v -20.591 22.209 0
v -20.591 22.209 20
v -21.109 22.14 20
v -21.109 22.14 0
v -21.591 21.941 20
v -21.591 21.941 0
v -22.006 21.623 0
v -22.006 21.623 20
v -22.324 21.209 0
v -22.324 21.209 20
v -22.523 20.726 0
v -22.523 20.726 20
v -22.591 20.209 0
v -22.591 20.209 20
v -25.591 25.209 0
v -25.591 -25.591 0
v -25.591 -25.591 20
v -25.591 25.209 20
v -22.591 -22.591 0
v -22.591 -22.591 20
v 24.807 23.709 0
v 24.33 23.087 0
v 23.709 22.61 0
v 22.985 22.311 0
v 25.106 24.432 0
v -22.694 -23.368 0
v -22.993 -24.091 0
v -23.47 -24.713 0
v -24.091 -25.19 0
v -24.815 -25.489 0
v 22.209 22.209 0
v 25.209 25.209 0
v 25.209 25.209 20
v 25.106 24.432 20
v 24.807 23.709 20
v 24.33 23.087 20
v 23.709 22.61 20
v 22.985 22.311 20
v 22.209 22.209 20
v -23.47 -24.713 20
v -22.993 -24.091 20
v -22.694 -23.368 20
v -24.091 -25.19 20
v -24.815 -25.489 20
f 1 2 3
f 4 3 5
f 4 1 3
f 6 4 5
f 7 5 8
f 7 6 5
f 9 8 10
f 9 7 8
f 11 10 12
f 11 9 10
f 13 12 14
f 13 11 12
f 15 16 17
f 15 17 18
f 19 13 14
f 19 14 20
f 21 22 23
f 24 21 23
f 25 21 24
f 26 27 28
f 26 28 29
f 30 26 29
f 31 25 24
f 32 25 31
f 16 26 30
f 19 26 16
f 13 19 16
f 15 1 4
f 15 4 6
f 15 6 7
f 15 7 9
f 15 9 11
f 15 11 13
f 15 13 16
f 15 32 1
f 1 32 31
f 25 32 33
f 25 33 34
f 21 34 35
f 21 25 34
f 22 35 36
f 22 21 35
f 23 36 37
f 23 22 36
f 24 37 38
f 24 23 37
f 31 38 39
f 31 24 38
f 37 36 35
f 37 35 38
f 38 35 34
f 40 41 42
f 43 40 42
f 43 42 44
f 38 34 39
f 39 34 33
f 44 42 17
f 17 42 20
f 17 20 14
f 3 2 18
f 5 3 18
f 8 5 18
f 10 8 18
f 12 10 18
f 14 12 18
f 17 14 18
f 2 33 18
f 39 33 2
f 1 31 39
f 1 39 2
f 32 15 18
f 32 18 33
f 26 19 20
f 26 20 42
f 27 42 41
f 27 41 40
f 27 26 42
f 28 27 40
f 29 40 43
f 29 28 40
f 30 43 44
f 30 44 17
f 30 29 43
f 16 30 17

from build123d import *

# Parameters (mm, degrees)
SALIENTE_EXTRUIR1_DEPTH = 20


with BuildPart() as part:
    # Croquis1 → Saliente-Extruir1 (new body)
    with BuildSketch(Plane.XY):
        with BuildLine():
            Line((22.208537854, 22.208537854), (-20.591462146, 22.208537854))
            ThreePointArc((-20.591462146, 22.208537854), (-22.005675708, 21.622751417), (-22.591462146, 20.208537854))
            Line((-22.591462146, 20.208537854), (-22.591462146, -22.591462146))
            ThreePointArc((-22.591462146, -22.591462146), (-23.470141802, -24.712782489), (-25.591462146, -25.591462146))
            Line((-25.591462146, -25.591462146), (-25.591462146, 25.208537854))
            Line((-25.591462146, 25.208537854), (25.208537854, 25.208537854))
            ThreePointArc((25.208537854, 25.208537854), (24.329858198, 23.087217511), (22.208537854, 22.208537854))
        make_face()
    extrude(amount=SALIENTE_EXTRUIR1_DEPTH)


solid = part.part
